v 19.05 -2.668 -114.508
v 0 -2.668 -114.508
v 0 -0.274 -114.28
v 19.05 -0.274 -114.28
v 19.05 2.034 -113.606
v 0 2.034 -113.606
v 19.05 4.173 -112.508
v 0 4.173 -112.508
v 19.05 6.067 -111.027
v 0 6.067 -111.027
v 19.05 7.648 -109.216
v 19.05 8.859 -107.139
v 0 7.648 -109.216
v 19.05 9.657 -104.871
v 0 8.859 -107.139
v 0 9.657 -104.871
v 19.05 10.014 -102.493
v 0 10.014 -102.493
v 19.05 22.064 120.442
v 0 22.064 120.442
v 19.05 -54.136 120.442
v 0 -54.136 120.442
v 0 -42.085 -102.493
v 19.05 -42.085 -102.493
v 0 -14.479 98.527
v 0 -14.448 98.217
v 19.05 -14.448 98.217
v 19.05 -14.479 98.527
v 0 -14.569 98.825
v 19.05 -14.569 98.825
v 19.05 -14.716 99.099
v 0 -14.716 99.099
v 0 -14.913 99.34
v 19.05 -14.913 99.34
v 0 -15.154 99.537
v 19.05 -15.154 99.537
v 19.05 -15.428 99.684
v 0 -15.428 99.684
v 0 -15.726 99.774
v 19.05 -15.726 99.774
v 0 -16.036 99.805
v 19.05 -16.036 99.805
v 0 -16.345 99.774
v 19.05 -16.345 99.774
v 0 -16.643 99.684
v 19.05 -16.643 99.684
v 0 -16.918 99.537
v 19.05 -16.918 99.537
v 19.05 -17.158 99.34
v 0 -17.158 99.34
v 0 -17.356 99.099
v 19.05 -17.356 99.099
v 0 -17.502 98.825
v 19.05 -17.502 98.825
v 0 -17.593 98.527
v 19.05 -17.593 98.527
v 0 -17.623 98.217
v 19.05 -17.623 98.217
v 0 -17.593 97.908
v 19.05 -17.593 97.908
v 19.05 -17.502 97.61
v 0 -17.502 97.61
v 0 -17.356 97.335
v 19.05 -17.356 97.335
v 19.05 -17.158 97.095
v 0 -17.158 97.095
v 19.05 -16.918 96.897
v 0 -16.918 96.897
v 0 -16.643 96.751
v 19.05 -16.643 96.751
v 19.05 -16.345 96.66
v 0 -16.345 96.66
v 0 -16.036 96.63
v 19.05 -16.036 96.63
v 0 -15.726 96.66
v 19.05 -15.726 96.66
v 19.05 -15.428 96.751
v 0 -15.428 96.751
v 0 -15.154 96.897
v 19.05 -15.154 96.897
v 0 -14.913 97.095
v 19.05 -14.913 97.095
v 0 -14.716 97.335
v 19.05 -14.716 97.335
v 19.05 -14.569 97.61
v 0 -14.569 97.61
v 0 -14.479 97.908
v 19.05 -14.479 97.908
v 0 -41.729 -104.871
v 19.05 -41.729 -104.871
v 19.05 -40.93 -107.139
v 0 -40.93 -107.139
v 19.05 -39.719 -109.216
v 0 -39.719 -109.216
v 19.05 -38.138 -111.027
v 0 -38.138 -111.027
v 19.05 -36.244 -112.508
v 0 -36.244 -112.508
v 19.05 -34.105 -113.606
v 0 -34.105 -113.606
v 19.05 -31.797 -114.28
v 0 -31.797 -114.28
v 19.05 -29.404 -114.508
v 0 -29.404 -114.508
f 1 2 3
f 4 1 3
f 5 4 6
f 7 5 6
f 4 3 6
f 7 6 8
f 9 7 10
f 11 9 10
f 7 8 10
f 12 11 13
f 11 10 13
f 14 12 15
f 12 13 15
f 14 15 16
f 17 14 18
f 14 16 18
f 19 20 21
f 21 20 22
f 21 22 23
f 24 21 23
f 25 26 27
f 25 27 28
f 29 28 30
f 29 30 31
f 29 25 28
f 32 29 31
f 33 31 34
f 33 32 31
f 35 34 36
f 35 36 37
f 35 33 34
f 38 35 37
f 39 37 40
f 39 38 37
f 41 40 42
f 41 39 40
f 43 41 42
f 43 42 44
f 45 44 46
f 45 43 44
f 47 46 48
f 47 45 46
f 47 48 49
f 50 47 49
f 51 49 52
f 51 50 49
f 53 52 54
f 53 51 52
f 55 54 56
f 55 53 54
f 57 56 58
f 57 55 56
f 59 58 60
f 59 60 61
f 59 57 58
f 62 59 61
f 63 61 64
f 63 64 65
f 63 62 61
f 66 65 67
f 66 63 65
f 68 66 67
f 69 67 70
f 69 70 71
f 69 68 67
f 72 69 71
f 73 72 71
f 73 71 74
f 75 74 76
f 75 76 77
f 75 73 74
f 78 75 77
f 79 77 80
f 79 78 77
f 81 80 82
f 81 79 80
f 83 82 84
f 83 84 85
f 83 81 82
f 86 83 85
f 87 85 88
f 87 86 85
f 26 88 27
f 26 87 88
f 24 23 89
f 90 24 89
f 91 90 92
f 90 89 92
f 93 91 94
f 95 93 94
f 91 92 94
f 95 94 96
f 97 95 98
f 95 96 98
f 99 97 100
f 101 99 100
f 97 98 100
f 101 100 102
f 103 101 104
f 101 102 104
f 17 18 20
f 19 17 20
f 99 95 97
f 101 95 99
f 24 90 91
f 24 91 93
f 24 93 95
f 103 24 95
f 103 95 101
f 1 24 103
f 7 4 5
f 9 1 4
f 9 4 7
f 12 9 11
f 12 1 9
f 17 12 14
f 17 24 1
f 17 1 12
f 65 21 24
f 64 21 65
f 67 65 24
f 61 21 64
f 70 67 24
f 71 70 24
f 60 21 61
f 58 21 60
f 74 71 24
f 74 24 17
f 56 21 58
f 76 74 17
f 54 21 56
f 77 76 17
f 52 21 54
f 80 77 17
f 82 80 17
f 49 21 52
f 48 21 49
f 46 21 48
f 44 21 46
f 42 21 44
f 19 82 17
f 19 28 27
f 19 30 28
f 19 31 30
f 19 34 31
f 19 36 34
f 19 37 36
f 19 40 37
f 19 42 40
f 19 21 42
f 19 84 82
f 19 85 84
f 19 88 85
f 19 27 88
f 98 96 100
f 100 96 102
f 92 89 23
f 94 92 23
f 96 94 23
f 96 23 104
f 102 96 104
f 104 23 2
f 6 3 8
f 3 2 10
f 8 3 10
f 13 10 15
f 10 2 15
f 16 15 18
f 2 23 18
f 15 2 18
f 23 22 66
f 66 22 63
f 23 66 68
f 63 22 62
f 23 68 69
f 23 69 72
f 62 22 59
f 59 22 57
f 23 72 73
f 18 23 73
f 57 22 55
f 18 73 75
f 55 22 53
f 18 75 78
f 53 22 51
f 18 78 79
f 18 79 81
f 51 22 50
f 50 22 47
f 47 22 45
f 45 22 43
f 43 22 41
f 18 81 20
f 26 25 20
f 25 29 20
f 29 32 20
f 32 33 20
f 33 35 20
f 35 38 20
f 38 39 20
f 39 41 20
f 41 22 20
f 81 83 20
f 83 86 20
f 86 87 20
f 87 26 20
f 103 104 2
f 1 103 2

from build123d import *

# Parameters (mm, degrees)
F0_R     = 1.5875
F1_DEPTH = 19.05


with BuildPart() as f1:
    # F0 (on Right) → F1 (new body)
    with BuildSketch(Plane.YZ):
        with BuildLine():
            ThreePointArc((-42.08502, -102.493227), (-38.138072, -111.027168), (-29.403534, -114.507741))
            Line((-29.403534, -114.507741), (-2.667641, -114.507741))
            ThreePointArc((-2.667641, -114.507741), (6.066898, -111.027168), (10.013846, -102.493227))
            Line((10.013846, -102.493227), (22.064413, 120.442259))
            Line((22.064413, 120.442259), (-54.135587, 120.442259))
            Line((-54.135587, 120.442259), (-42.08502, -102.493227))
        make_face()
        with Locations((-16.035587, 98.217259)):
            Circle(F0_R, mode=Mode.SUBTRACT)
    extrude(amount=F1_DEPTH)


solid = f1.part
